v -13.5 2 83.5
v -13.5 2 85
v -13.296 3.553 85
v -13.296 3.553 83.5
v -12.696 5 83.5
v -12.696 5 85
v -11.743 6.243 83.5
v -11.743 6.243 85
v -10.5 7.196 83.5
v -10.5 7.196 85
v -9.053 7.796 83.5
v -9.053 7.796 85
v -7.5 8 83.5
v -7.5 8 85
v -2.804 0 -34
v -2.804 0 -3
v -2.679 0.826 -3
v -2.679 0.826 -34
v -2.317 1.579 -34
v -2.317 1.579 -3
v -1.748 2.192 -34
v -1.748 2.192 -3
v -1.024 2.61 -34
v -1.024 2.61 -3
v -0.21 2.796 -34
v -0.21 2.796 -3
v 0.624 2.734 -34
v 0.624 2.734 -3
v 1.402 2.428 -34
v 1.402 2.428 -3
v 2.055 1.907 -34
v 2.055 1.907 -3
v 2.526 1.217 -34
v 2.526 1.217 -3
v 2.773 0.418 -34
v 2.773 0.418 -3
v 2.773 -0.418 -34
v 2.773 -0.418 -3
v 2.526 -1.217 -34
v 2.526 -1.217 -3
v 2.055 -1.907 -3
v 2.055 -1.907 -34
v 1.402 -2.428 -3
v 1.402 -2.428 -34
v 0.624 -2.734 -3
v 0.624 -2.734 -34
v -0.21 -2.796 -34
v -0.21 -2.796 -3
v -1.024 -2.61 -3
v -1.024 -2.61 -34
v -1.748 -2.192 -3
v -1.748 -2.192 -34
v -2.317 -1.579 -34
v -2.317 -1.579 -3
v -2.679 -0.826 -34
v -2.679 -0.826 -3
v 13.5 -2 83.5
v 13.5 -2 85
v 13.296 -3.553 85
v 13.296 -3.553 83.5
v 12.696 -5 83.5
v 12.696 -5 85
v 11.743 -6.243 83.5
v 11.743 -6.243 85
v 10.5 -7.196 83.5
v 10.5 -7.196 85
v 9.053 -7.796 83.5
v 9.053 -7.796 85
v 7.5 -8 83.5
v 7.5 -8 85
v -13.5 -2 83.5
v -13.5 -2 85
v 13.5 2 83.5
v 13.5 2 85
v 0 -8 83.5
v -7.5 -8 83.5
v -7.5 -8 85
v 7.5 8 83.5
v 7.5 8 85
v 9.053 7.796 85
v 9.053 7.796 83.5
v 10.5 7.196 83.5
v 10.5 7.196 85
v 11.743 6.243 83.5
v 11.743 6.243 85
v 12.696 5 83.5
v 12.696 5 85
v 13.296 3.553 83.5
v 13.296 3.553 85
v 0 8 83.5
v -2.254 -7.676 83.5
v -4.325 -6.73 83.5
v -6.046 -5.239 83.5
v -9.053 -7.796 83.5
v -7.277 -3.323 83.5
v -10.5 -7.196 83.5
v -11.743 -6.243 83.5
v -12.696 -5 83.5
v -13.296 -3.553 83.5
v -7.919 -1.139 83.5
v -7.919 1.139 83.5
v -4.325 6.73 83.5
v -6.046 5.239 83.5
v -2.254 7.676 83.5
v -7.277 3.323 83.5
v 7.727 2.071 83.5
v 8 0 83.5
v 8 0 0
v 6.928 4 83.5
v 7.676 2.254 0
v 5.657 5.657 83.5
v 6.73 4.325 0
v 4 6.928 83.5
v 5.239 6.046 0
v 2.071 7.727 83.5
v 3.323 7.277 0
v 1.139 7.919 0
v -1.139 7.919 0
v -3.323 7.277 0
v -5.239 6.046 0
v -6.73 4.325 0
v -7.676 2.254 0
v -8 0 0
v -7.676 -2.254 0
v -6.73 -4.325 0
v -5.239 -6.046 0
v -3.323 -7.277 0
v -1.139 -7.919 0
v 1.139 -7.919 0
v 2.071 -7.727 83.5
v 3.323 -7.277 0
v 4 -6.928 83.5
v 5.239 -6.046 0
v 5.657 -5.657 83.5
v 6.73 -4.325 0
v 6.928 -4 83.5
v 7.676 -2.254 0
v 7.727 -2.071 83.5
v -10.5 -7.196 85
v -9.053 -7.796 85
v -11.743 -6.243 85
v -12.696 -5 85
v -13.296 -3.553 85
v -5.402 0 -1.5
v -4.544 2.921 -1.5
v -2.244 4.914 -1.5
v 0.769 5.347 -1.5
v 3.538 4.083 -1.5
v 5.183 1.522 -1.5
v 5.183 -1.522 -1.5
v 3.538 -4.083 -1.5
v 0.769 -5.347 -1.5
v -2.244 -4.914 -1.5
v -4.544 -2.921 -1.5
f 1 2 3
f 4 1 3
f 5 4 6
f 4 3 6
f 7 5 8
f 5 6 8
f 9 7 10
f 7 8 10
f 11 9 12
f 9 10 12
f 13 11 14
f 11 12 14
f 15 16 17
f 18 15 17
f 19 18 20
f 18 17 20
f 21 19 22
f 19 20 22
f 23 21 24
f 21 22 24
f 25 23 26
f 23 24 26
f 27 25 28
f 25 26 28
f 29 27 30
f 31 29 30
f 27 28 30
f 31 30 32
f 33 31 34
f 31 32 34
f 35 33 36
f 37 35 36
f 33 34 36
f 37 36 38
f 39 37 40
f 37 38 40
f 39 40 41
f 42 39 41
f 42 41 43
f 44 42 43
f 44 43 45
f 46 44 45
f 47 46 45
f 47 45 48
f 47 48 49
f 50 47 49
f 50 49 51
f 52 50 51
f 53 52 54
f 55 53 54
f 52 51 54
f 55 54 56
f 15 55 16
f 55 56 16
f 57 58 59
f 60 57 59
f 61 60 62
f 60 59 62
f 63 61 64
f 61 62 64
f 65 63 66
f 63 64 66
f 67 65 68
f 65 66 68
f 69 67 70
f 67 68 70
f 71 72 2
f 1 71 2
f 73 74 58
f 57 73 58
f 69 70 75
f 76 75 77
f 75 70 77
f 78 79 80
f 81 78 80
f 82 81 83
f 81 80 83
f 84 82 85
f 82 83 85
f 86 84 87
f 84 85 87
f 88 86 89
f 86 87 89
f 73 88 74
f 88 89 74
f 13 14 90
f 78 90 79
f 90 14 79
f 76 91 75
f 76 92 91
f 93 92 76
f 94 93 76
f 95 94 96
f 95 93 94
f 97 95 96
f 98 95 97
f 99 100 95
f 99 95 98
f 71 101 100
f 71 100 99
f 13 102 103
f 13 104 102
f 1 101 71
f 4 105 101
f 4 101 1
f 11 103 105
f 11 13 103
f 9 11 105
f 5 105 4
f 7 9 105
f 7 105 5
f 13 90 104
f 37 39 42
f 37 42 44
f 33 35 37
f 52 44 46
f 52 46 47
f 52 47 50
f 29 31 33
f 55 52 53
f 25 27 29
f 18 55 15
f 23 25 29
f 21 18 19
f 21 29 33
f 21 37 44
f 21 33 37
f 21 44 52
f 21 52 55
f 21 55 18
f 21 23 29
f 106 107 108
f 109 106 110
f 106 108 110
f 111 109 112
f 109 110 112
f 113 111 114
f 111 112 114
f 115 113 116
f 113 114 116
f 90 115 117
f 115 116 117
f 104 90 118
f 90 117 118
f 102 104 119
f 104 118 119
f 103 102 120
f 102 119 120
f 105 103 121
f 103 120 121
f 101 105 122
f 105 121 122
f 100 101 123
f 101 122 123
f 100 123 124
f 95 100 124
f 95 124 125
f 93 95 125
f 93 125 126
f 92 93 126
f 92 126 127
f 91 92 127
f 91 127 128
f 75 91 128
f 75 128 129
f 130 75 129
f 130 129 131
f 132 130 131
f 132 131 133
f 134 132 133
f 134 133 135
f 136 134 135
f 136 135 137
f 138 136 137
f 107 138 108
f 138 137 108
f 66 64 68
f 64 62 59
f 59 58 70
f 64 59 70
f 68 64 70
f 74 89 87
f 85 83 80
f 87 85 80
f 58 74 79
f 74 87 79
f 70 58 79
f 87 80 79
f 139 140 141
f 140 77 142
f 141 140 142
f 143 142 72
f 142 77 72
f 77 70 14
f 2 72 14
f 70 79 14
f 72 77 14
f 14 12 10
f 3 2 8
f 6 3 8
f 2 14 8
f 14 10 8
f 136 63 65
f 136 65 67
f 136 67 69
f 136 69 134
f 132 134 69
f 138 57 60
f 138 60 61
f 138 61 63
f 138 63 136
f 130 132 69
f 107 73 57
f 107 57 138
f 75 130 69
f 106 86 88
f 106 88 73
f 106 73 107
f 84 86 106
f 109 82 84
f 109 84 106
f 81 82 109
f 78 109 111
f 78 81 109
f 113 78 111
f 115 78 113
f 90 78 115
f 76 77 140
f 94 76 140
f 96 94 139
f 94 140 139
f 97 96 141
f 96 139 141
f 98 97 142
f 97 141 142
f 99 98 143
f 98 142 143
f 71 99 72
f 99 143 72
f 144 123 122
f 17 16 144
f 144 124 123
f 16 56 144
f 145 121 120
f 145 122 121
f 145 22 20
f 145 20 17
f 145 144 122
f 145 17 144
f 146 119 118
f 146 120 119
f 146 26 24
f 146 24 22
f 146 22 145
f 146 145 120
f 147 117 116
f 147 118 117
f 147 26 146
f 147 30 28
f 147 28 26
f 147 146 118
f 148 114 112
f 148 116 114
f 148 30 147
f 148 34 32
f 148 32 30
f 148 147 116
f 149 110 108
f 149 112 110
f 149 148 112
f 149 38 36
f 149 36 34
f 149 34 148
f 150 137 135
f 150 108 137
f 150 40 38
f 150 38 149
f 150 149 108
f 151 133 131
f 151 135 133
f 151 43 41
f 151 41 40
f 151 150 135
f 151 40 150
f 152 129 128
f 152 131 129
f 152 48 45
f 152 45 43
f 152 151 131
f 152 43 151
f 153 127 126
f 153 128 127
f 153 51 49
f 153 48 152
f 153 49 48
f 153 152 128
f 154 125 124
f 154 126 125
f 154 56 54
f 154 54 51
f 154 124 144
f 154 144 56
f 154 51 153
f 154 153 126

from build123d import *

# Parameters (mm, degrees)
SKETCH1_R           = 8
BOSS_EXTRUDE1_DEPTH = 85
SKETCH2_R           = 8
BOSS_EXTRUDE3_DEPTH = 3
BOSS_EXTRUDE3_TAPER = 60
SKETCH3_R           = 2.803847577
BOSS_EXTRUDE4_DEPTH = 31
BOSS_EXTRUDE5_DEPTH = 1.5


with BuildPart() as part:
    # Sketch1 → Boss-Extrude1 (new body)
    with BuildSketch(Plane(origin=(0, 0, 0), x_dir=(0, 1, 0), z_dir=(0, 0, 1))):
        with Locations(Location((0, 0, 0), (0, 0, 270))):
            Circle(SKETCH1_R)
    extrude(amount=BOSS_EXTRUDE1_DEPTH)

    # Sketch2 → Boss-Extrude3 (add)
    with BuildSketch(Plane(origin=(0, 0, 0), x_dir=(1, 0, 0), z_dir=(0, 0, -1))):
        with Locations(Location((0, 0, 0), (0, 0, 180))):
            Circle(SKETCH2_R)
    extrude(amount=BOSS_EXTRUDE3_DEPTH, taper=BOSS_EXTRUDE3_TAPER)

    # Sketch3 → Boss-Extrude4 (add)
    with BuildSketch(Plane(origin=(0, 0, -3), x_dir=(1, 0, 0), z_dir=(0, 0, -1))):
        with Locations(Location((0, 0, 0), (0, 0, 180))):
            Circle(SKETCH3_R)
    extrude(amount=BOSS_EXTRUDE4_DEPTH)

    # Sketch4 → Boss-Extrude5 (add)
    with BuildSketch(Plane.XY.offset(85)):
        with BuildLine():
            Line((-7.5, 8), (7.5, 8))
            ThreePointArc((7.5, 8), (11.742640687, 6.242640687), (13.5, 2))
            Line((13.5, 2), (13.5, -2))
            ThreePointArc((13.5, -2), (11.742640687, -6.242640687), (7.5, -8))
            Line((7.5, -8), (-7.5, -8))
            ThreePointArc((-7.5, -8), (-11.742640687, -6.242640687), (-13.5, -2))
            Line((-13.5, -2), (-13.5, 2))
            ThreePointArc((-13.5, 2), (-11.742640687, 6.242640687), (-7.5, 8))
        make_face()
    extrude(amount=-BOSS_EXTRUDE5_DEPTH)


solid = part.part
